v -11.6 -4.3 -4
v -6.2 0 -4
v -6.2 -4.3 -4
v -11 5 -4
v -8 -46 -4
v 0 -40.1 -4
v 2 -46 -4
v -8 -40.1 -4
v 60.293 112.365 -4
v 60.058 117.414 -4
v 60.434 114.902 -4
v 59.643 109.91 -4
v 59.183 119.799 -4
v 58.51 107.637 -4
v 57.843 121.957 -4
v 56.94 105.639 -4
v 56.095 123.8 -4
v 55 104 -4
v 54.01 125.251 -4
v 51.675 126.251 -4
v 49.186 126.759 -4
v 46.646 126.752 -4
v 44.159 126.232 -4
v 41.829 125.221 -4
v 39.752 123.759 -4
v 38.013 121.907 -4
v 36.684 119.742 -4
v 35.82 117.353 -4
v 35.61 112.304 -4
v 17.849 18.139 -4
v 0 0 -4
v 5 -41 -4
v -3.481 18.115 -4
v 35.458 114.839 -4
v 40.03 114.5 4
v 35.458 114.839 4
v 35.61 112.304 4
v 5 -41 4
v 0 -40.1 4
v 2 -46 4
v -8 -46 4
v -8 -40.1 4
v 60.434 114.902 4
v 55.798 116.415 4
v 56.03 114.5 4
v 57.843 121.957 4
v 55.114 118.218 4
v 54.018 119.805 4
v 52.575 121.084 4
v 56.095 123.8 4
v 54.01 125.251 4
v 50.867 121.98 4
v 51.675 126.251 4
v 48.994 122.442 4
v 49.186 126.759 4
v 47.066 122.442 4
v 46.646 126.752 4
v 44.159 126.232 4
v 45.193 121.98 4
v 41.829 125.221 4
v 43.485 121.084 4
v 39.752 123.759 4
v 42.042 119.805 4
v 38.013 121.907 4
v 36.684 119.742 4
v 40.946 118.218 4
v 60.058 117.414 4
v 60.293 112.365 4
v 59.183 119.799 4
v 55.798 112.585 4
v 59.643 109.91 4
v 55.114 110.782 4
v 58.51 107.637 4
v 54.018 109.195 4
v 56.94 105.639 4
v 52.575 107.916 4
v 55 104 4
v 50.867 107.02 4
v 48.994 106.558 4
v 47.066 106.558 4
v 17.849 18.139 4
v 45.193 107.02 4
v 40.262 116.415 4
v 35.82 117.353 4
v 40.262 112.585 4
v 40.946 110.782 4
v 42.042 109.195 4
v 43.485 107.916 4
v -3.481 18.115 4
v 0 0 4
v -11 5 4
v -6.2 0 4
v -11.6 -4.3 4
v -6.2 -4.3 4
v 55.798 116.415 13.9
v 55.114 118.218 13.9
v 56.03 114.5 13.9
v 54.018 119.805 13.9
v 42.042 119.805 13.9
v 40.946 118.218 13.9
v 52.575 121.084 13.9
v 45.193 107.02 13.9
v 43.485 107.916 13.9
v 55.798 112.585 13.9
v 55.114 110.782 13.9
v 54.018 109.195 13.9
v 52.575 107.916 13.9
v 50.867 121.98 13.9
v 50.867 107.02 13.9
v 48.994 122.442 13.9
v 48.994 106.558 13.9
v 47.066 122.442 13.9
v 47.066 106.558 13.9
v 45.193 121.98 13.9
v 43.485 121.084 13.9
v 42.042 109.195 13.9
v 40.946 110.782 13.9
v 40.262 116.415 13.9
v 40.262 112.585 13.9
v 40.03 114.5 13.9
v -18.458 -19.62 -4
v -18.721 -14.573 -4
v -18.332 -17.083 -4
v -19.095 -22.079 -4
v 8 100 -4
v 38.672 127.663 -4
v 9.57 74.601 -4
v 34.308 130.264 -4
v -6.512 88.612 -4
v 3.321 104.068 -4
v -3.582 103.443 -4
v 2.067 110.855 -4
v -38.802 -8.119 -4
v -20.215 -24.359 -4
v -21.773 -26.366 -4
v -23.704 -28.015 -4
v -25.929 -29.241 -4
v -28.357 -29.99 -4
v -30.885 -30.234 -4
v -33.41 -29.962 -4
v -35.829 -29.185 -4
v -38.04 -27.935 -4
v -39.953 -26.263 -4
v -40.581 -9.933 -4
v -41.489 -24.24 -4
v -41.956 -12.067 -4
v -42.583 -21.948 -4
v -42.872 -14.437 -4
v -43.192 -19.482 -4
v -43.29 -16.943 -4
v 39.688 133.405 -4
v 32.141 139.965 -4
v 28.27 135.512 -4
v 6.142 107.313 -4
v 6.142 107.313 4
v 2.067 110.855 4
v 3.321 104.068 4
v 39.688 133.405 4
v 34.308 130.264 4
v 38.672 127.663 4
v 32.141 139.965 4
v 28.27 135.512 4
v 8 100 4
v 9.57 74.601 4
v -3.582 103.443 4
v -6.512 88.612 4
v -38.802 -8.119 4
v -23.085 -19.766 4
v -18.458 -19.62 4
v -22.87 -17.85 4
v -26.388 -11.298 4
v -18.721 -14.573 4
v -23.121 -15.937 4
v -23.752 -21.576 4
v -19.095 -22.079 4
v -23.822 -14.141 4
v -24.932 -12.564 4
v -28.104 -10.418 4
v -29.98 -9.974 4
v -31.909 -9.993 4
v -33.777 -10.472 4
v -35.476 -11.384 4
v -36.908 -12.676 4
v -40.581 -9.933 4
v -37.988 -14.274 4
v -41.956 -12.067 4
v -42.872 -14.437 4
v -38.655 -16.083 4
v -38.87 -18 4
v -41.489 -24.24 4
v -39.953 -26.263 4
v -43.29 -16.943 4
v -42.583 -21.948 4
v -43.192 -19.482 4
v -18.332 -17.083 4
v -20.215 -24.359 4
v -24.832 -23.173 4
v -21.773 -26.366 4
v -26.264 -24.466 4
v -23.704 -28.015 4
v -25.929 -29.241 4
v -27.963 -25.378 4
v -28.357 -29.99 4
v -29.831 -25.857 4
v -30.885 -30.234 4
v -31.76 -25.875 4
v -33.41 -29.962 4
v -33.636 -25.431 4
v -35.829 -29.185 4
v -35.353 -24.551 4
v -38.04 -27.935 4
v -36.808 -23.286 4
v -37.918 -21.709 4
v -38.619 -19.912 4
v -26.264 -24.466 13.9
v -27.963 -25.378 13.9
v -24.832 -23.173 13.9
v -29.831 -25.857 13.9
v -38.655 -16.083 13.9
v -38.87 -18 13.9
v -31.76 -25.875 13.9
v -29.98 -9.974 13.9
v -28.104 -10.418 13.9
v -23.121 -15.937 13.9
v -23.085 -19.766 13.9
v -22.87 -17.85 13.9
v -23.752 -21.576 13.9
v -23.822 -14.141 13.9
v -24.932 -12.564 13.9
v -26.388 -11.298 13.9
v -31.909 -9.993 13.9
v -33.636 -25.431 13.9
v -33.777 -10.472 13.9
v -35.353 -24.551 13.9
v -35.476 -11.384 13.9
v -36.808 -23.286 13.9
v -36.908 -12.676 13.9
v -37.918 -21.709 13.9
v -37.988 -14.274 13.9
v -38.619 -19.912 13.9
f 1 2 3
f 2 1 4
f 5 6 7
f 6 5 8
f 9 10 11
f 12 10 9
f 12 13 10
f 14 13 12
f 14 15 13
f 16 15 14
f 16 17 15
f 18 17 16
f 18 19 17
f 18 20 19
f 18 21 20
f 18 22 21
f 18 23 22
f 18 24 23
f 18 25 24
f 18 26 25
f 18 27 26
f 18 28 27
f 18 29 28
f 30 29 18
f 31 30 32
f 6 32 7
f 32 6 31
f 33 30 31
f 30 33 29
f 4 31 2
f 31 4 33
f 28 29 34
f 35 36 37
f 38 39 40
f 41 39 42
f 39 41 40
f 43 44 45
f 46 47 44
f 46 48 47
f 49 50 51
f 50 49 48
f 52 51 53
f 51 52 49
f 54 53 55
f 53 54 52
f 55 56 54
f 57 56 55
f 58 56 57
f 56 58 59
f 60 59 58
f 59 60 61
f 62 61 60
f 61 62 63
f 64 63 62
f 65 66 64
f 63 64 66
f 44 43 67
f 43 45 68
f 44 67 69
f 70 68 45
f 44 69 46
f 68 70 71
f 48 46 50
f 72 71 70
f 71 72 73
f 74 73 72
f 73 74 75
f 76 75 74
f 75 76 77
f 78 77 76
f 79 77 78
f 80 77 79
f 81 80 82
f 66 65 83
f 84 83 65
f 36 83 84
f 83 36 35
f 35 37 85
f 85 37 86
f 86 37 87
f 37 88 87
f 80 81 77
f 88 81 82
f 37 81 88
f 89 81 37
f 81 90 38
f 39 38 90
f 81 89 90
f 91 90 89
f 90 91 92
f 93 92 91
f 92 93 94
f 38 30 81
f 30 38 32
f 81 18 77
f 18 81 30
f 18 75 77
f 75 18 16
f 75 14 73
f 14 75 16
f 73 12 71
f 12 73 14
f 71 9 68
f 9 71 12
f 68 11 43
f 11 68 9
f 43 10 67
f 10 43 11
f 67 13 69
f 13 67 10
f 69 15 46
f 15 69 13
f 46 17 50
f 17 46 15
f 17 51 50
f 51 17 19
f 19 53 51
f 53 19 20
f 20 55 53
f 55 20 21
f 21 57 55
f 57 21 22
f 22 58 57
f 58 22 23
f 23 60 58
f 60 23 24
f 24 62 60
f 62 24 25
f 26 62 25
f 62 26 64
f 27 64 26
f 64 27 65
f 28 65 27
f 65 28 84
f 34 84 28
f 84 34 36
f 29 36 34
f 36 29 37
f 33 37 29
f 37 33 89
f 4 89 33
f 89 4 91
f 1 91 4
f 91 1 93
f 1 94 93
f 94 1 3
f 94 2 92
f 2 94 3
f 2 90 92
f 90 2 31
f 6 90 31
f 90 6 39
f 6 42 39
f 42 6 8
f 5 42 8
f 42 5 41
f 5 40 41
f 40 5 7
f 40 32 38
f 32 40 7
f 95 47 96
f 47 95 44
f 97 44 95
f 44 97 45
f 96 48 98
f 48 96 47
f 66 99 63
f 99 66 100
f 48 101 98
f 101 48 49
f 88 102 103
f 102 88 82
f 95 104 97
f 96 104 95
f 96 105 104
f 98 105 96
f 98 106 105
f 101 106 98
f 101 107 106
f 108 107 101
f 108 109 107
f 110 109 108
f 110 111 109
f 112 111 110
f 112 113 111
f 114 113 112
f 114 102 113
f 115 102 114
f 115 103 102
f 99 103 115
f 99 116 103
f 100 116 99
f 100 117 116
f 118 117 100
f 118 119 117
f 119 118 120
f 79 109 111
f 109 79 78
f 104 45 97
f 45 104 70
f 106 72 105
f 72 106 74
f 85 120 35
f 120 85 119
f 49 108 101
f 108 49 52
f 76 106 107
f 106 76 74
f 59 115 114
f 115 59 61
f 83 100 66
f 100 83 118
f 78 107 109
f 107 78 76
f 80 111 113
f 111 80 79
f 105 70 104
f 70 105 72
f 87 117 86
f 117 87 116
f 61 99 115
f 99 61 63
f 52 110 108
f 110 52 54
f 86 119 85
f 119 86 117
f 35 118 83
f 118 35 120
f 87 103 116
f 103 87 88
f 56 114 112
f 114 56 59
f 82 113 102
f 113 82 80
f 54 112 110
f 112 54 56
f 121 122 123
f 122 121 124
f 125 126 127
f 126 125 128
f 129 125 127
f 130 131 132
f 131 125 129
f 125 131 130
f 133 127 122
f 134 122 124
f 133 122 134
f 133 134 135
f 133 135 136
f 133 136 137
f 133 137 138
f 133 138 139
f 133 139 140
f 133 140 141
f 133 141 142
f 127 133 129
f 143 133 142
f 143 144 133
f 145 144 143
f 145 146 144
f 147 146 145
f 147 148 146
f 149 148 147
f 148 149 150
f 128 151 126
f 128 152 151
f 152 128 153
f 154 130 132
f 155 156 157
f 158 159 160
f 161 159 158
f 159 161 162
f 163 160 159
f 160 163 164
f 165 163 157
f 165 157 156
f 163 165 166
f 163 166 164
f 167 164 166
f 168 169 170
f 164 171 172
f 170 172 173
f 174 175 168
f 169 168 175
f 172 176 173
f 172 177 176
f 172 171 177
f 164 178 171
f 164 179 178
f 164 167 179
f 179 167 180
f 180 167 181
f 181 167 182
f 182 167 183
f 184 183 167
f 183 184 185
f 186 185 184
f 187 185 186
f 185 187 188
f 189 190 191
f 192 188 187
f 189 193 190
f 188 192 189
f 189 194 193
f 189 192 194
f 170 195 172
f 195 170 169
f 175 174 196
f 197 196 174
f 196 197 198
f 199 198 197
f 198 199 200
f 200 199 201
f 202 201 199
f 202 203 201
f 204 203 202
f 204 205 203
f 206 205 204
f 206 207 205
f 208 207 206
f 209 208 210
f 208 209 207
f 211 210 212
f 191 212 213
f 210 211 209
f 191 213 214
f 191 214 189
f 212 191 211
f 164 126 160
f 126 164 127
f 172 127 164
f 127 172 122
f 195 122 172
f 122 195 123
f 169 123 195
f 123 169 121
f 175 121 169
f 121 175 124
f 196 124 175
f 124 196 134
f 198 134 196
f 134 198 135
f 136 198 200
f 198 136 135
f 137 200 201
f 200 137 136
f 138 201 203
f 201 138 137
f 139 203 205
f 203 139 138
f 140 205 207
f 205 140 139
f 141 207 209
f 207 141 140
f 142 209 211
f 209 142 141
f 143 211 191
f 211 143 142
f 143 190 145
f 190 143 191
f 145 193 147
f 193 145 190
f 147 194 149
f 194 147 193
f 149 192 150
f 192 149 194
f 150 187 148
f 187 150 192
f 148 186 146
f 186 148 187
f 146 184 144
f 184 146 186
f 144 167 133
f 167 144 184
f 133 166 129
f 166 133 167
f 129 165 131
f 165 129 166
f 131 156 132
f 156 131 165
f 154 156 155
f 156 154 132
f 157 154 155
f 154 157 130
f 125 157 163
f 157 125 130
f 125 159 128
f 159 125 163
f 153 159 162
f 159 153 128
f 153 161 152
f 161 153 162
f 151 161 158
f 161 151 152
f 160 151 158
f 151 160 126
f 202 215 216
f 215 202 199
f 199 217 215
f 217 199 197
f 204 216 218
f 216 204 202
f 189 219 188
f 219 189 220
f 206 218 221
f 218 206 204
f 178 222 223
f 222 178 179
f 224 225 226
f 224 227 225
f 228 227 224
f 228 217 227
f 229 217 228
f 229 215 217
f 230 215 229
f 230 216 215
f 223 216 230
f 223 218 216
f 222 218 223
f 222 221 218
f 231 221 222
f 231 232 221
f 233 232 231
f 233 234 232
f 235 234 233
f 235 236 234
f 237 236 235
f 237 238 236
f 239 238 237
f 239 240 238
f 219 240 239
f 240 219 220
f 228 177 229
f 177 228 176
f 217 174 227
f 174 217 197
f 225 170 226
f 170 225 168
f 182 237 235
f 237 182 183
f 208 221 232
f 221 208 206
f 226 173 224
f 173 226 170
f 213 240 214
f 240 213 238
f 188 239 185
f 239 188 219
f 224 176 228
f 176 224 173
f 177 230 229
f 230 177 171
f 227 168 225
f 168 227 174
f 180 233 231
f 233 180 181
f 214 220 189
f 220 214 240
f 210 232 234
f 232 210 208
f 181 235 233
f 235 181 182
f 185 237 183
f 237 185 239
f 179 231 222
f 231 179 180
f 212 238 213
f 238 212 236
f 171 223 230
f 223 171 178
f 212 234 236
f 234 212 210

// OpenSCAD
// PRUSA iteration3
// Spool holder
// GNU GPL v3
// Josef Průša <iam@josefprusa.cz> and contributors
// http://www.reprap.org/wiki/Prusa_Mendel
// http://prusamendel.org

module dxf_holder(){
linear_extrude(height = 8, center = true, convexity = 5)
   import (file = "spool holdahMK3.dxf", layer = "0");
}
module spool_holder_left(){
    dxf_holder();
    translate([51.53-3.5,123-5-3.5,3.9])cylinder(h = 10, r=8);
    }
module spool_holder_right(){
    mirror([1,0,0])spool_holder_left();
    }
translate([8,100,0])rotate([0,0,139])spool_holder_right();
spool_holder_left();
